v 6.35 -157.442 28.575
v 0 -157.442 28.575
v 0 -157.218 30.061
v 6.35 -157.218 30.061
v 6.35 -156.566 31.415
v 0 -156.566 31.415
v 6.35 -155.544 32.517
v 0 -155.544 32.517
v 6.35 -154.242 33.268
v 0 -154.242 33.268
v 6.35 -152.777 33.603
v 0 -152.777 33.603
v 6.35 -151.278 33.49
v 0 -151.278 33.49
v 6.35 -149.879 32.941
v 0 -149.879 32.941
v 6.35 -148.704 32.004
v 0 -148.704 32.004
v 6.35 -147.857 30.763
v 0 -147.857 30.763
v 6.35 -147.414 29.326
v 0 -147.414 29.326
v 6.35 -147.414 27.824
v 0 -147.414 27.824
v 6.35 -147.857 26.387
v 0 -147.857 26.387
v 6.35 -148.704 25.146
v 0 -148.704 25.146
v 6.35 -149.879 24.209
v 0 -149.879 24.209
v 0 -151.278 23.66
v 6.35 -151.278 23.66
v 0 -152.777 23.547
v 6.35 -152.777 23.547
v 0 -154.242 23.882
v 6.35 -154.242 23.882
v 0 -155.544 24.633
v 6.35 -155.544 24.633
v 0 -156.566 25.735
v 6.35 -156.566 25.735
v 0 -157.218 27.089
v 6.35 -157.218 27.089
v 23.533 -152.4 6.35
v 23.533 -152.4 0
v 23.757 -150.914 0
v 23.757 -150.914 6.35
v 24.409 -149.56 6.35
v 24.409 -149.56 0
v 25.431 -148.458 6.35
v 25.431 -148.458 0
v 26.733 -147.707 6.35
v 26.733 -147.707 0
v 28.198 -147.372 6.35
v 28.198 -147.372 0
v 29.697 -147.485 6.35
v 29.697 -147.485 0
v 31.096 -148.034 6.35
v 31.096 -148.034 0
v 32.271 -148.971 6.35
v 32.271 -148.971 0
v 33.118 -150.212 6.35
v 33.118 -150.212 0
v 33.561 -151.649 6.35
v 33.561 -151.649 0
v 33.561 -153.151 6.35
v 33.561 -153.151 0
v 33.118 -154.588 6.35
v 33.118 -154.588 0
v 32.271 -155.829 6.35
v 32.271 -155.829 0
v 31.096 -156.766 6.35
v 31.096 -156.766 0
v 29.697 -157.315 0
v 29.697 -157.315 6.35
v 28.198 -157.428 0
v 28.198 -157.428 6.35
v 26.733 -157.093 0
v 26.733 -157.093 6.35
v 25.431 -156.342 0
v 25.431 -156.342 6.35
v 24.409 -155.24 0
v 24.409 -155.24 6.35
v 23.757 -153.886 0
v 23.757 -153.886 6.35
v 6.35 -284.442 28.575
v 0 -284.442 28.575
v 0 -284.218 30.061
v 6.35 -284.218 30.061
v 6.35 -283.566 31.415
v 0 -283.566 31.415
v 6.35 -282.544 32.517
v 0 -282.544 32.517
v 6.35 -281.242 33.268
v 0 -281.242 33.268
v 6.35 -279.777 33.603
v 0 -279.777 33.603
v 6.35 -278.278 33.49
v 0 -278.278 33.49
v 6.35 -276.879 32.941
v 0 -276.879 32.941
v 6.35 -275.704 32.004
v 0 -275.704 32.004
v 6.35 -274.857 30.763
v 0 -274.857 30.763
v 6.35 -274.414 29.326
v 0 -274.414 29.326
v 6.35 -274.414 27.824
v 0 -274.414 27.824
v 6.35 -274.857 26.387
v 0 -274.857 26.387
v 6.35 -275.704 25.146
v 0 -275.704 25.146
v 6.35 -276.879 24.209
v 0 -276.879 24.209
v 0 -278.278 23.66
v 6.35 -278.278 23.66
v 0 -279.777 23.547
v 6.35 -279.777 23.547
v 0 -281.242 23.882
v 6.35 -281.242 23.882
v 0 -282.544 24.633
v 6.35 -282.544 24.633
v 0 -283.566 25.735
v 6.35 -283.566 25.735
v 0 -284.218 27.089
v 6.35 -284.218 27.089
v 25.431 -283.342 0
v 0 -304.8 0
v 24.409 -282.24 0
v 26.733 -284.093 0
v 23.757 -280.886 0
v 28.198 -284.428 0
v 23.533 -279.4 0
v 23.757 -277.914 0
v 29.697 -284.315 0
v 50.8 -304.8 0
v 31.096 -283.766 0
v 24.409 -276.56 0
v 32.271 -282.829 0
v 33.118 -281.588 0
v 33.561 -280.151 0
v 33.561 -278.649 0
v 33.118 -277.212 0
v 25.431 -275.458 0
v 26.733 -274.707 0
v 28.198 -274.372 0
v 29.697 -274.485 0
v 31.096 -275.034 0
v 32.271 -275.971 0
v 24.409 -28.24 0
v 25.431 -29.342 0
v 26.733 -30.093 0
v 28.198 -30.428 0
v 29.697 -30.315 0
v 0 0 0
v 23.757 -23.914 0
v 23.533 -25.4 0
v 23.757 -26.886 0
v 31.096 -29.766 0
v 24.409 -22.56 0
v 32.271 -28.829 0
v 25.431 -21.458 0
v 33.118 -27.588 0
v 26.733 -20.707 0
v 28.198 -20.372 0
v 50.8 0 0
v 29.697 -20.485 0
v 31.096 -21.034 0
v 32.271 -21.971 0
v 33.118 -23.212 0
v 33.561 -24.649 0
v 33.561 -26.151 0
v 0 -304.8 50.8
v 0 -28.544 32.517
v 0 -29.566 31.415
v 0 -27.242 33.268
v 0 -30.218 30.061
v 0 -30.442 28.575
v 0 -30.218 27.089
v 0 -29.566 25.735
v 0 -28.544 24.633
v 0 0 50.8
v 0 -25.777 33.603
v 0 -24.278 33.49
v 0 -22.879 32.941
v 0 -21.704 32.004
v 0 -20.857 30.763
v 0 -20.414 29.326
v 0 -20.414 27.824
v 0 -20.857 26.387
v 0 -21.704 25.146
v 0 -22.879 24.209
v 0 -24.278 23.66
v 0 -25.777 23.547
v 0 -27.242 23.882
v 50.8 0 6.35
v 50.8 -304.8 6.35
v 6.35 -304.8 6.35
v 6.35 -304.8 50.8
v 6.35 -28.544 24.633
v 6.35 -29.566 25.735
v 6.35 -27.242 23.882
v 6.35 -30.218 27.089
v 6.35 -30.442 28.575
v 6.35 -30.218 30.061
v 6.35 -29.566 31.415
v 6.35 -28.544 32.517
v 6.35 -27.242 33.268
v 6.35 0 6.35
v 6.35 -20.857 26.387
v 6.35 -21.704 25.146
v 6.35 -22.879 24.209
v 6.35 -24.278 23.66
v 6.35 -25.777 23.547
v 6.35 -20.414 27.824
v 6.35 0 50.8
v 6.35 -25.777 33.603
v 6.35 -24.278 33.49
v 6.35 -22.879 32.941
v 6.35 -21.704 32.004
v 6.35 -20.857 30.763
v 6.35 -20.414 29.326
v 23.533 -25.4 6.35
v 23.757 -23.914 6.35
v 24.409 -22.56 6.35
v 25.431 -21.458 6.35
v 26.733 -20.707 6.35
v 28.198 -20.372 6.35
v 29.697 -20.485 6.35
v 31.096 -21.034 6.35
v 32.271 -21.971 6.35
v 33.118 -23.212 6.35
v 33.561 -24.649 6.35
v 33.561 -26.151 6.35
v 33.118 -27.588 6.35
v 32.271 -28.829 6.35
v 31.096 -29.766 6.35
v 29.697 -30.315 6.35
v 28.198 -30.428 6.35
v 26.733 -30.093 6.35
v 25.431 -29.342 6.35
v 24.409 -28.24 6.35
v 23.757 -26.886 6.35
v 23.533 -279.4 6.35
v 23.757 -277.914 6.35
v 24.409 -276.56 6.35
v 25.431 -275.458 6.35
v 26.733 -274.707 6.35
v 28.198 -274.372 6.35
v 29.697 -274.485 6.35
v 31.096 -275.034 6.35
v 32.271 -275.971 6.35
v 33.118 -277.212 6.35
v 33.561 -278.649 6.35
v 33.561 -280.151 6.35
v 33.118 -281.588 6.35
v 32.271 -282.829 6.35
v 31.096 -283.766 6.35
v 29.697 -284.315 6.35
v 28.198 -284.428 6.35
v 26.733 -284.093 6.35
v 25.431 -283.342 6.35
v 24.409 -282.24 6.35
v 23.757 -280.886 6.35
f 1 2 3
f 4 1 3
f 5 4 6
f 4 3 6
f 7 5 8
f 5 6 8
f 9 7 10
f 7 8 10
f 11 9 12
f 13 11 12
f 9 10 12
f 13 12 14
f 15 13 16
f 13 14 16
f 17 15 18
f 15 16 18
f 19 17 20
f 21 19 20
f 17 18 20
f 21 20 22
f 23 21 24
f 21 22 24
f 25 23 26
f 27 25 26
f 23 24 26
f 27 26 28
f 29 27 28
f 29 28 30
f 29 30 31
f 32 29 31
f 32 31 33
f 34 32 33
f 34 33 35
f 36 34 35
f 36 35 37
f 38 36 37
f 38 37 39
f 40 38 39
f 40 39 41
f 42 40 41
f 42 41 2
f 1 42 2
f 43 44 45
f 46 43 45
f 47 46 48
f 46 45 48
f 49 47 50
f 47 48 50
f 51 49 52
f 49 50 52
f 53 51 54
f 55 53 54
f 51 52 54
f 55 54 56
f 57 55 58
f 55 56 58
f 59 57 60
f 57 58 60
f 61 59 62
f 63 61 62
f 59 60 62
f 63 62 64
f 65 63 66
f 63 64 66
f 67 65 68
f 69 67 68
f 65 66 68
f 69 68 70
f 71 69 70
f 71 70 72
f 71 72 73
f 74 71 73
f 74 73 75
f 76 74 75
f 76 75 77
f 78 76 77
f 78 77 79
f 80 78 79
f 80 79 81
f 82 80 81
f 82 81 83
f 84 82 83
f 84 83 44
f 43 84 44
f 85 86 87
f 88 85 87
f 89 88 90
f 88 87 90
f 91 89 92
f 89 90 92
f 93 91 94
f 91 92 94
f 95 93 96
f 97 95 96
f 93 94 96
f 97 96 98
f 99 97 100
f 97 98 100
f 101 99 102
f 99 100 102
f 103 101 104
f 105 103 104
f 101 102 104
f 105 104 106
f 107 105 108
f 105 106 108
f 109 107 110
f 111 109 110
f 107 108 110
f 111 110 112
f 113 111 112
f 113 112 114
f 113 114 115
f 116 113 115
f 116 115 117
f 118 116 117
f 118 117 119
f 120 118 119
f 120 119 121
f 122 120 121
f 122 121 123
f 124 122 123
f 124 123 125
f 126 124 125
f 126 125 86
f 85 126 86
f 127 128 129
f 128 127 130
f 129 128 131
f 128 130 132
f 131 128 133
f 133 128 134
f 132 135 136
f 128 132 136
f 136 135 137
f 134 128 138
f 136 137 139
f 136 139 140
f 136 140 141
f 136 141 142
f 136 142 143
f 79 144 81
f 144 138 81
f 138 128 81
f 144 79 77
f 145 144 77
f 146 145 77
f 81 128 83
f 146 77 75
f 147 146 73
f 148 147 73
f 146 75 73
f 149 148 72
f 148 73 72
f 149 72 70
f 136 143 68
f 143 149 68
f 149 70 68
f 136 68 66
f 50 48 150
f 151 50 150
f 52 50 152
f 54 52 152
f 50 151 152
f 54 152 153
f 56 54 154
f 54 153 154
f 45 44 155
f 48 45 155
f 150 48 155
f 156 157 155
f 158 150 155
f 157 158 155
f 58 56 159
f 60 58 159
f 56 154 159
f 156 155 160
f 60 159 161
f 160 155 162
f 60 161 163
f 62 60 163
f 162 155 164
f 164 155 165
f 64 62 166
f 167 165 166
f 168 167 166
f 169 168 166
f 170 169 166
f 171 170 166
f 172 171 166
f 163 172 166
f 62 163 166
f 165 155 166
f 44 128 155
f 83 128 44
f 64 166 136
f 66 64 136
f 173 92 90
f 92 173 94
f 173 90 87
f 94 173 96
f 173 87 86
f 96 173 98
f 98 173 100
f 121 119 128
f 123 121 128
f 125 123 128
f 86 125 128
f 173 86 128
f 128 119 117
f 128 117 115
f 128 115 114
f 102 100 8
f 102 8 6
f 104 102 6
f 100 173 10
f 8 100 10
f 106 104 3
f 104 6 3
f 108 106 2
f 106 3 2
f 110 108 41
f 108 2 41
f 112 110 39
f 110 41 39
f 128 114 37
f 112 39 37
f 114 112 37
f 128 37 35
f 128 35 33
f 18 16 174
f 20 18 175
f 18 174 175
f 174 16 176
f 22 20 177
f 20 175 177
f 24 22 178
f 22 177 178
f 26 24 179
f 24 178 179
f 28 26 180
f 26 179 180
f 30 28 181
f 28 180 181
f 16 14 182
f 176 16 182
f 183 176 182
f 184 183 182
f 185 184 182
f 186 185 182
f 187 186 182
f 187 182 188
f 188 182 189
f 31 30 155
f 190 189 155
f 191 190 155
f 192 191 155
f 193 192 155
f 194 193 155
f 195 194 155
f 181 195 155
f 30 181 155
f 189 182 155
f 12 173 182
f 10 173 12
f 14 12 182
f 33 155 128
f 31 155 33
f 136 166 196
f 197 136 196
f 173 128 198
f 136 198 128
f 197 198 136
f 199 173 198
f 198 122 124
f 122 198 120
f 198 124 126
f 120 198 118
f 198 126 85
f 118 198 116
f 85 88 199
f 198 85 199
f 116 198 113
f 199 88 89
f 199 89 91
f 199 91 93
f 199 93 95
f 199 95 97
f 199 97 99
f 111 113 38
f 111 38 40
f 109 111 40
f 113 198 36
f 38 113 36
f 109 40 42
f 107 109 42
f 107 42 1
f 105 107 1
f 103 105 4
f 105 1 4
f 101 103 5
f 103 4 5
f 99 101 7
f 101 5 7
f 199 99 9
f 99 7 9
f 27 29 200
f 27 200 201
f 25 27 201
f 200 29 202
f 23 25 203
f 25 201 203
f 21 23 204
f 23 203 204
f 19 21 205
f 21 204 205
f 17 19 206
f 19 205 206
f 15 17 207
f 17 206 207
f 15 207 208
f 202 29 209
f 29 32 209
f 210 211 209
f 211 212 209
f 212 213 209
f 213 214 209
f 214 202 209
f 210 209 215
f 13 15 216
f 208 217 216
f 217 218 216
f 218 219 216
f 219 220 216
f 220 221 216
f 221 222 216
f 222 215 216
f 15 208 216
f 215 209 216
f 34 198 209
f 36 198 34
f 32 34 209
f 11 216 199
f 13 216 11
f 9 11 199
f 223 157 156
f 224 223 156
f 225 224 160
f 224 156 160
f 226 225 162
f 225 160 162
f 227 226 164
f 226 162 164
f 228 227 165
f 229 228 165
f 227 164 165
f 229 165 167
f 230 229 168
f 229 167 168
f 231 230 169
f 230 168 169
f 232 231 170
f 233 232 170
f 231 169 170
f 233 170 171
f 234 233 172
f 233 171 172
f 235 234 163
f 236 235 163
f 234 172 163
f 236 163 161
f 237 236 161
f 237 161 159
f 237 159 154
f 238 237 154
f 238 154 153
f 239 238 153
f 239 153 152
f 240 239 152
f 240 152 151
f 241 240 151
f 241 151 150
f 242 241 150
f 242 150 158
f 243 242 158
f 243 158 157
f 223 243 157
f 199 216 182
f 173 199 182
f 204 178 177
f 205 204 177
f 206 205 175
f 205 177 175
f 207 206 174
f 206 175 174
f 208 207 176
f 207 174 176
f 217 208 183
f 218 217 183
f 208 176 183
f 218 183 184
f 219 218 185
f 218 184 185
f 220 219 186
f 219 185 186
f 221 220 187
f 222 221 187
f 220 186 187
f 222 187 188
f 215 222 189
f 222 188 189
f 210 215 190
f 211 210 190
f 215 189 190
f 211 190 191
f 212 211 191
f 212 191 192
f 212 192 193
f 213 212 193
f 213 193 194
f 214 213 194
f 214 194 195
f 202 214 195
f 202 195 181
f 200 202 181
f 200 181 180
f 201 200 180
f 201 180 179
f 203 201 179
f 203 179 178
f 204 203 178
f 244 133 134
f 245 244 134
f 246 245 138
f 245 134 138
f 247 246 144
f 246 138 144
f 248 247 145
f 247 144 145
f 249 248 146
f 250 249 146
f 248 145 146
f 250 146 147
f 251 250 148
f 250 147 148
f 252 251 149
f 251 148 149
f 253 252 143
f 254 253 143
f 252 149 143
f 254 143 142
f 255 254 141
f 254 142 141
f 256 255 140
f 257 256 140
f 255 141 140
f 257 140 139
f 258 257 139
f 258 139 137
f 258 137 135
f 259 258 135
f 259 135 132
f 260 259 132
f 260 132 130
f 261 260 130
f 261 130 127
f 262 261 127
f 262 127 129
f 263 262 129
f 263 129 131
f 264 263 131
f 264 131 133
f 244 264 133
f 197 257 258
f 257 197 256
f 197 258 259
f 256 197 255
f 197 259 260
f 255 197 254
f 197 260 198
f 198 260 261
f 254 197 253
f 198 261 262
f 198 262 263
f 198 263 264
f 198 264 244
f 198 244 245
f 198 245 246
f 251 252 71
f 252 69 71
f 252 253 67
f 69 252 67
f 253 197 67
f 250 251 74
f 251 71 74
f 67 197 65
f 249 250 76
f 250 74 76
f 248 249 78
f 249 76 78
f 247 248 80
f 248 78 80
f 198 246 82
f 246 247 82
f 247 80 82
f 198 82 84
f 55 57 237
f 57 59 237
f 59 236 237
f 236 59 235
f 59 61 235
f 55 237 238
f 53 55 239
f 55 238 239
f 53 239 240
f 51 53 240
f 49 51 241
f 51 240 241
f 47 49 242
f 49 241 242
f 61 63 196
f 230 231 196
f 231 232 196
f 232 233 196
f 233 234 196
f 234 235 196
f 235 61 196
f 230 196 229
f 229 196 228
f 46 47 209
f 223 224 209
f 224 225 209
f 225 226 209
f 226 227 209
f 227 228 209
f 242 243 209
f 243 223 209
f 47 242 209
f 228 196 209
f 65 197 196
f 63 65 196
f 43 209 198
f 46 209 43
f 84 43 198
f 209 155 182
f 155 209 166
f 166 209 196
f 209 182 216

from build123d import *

# Parameters (mm, degrees)
F1_DEPTH       = 304.8
F4_D           = 10.0838
F4_DEPTH       = 20.6502
F4_TIP         = 3.0294791551
F4_ON_F2_D     = 10.0838
F4_ON_F2_DEPTH = 20.6502
F4_ON_F2_TIP   = 3.0294791551


with BuildPart() as f1:
    # F0 (on Front) → F1 (new body)
    with BuildSketch(Plane.XZ):
        Polygon((0, 50.8), (0, 0), (50.8, 0), (50.8, 6.35), (6.35, 6.35), (6.35, 50.8), align=None)
    extrude(amount=F1_DEPTH)

    # F4
    with Locations(Plane.XY.offset(6.35)):
        with Locations((28.575, -152.4), (28.575, -25.4), (28.575, -279.4)):
            Hole(F4_D / 2, depth=F4_DEPTH)
            with Locations((0, 0, -(F4_DEPTH + F4_TIP / 2))):  # 118° drill point
                Cone(0, F4_D / 2, F4_TIP, mode=Mode.SUBTRACT)

    # F4 on F2
    with Locations(Plane.YZ.offset(6.35)):
        with Locations((-279.4, 28.575), (-152.4, 28.575), (-25.4, 28.575)):
            Hole(F4_ON_F2_D / 2, depth=F4_ON_F2_DEPTH)
            with Locations((0, 0, -(F4_ON_F2_DEPTH + F4_ON_F2_TIP / 2))):  # 118° drill point
                Cone(0, F4_ON_F2_D / 2, F4_ON_F2_TIP, mode=Mode.SUBTRACT)


solid = f1.part
